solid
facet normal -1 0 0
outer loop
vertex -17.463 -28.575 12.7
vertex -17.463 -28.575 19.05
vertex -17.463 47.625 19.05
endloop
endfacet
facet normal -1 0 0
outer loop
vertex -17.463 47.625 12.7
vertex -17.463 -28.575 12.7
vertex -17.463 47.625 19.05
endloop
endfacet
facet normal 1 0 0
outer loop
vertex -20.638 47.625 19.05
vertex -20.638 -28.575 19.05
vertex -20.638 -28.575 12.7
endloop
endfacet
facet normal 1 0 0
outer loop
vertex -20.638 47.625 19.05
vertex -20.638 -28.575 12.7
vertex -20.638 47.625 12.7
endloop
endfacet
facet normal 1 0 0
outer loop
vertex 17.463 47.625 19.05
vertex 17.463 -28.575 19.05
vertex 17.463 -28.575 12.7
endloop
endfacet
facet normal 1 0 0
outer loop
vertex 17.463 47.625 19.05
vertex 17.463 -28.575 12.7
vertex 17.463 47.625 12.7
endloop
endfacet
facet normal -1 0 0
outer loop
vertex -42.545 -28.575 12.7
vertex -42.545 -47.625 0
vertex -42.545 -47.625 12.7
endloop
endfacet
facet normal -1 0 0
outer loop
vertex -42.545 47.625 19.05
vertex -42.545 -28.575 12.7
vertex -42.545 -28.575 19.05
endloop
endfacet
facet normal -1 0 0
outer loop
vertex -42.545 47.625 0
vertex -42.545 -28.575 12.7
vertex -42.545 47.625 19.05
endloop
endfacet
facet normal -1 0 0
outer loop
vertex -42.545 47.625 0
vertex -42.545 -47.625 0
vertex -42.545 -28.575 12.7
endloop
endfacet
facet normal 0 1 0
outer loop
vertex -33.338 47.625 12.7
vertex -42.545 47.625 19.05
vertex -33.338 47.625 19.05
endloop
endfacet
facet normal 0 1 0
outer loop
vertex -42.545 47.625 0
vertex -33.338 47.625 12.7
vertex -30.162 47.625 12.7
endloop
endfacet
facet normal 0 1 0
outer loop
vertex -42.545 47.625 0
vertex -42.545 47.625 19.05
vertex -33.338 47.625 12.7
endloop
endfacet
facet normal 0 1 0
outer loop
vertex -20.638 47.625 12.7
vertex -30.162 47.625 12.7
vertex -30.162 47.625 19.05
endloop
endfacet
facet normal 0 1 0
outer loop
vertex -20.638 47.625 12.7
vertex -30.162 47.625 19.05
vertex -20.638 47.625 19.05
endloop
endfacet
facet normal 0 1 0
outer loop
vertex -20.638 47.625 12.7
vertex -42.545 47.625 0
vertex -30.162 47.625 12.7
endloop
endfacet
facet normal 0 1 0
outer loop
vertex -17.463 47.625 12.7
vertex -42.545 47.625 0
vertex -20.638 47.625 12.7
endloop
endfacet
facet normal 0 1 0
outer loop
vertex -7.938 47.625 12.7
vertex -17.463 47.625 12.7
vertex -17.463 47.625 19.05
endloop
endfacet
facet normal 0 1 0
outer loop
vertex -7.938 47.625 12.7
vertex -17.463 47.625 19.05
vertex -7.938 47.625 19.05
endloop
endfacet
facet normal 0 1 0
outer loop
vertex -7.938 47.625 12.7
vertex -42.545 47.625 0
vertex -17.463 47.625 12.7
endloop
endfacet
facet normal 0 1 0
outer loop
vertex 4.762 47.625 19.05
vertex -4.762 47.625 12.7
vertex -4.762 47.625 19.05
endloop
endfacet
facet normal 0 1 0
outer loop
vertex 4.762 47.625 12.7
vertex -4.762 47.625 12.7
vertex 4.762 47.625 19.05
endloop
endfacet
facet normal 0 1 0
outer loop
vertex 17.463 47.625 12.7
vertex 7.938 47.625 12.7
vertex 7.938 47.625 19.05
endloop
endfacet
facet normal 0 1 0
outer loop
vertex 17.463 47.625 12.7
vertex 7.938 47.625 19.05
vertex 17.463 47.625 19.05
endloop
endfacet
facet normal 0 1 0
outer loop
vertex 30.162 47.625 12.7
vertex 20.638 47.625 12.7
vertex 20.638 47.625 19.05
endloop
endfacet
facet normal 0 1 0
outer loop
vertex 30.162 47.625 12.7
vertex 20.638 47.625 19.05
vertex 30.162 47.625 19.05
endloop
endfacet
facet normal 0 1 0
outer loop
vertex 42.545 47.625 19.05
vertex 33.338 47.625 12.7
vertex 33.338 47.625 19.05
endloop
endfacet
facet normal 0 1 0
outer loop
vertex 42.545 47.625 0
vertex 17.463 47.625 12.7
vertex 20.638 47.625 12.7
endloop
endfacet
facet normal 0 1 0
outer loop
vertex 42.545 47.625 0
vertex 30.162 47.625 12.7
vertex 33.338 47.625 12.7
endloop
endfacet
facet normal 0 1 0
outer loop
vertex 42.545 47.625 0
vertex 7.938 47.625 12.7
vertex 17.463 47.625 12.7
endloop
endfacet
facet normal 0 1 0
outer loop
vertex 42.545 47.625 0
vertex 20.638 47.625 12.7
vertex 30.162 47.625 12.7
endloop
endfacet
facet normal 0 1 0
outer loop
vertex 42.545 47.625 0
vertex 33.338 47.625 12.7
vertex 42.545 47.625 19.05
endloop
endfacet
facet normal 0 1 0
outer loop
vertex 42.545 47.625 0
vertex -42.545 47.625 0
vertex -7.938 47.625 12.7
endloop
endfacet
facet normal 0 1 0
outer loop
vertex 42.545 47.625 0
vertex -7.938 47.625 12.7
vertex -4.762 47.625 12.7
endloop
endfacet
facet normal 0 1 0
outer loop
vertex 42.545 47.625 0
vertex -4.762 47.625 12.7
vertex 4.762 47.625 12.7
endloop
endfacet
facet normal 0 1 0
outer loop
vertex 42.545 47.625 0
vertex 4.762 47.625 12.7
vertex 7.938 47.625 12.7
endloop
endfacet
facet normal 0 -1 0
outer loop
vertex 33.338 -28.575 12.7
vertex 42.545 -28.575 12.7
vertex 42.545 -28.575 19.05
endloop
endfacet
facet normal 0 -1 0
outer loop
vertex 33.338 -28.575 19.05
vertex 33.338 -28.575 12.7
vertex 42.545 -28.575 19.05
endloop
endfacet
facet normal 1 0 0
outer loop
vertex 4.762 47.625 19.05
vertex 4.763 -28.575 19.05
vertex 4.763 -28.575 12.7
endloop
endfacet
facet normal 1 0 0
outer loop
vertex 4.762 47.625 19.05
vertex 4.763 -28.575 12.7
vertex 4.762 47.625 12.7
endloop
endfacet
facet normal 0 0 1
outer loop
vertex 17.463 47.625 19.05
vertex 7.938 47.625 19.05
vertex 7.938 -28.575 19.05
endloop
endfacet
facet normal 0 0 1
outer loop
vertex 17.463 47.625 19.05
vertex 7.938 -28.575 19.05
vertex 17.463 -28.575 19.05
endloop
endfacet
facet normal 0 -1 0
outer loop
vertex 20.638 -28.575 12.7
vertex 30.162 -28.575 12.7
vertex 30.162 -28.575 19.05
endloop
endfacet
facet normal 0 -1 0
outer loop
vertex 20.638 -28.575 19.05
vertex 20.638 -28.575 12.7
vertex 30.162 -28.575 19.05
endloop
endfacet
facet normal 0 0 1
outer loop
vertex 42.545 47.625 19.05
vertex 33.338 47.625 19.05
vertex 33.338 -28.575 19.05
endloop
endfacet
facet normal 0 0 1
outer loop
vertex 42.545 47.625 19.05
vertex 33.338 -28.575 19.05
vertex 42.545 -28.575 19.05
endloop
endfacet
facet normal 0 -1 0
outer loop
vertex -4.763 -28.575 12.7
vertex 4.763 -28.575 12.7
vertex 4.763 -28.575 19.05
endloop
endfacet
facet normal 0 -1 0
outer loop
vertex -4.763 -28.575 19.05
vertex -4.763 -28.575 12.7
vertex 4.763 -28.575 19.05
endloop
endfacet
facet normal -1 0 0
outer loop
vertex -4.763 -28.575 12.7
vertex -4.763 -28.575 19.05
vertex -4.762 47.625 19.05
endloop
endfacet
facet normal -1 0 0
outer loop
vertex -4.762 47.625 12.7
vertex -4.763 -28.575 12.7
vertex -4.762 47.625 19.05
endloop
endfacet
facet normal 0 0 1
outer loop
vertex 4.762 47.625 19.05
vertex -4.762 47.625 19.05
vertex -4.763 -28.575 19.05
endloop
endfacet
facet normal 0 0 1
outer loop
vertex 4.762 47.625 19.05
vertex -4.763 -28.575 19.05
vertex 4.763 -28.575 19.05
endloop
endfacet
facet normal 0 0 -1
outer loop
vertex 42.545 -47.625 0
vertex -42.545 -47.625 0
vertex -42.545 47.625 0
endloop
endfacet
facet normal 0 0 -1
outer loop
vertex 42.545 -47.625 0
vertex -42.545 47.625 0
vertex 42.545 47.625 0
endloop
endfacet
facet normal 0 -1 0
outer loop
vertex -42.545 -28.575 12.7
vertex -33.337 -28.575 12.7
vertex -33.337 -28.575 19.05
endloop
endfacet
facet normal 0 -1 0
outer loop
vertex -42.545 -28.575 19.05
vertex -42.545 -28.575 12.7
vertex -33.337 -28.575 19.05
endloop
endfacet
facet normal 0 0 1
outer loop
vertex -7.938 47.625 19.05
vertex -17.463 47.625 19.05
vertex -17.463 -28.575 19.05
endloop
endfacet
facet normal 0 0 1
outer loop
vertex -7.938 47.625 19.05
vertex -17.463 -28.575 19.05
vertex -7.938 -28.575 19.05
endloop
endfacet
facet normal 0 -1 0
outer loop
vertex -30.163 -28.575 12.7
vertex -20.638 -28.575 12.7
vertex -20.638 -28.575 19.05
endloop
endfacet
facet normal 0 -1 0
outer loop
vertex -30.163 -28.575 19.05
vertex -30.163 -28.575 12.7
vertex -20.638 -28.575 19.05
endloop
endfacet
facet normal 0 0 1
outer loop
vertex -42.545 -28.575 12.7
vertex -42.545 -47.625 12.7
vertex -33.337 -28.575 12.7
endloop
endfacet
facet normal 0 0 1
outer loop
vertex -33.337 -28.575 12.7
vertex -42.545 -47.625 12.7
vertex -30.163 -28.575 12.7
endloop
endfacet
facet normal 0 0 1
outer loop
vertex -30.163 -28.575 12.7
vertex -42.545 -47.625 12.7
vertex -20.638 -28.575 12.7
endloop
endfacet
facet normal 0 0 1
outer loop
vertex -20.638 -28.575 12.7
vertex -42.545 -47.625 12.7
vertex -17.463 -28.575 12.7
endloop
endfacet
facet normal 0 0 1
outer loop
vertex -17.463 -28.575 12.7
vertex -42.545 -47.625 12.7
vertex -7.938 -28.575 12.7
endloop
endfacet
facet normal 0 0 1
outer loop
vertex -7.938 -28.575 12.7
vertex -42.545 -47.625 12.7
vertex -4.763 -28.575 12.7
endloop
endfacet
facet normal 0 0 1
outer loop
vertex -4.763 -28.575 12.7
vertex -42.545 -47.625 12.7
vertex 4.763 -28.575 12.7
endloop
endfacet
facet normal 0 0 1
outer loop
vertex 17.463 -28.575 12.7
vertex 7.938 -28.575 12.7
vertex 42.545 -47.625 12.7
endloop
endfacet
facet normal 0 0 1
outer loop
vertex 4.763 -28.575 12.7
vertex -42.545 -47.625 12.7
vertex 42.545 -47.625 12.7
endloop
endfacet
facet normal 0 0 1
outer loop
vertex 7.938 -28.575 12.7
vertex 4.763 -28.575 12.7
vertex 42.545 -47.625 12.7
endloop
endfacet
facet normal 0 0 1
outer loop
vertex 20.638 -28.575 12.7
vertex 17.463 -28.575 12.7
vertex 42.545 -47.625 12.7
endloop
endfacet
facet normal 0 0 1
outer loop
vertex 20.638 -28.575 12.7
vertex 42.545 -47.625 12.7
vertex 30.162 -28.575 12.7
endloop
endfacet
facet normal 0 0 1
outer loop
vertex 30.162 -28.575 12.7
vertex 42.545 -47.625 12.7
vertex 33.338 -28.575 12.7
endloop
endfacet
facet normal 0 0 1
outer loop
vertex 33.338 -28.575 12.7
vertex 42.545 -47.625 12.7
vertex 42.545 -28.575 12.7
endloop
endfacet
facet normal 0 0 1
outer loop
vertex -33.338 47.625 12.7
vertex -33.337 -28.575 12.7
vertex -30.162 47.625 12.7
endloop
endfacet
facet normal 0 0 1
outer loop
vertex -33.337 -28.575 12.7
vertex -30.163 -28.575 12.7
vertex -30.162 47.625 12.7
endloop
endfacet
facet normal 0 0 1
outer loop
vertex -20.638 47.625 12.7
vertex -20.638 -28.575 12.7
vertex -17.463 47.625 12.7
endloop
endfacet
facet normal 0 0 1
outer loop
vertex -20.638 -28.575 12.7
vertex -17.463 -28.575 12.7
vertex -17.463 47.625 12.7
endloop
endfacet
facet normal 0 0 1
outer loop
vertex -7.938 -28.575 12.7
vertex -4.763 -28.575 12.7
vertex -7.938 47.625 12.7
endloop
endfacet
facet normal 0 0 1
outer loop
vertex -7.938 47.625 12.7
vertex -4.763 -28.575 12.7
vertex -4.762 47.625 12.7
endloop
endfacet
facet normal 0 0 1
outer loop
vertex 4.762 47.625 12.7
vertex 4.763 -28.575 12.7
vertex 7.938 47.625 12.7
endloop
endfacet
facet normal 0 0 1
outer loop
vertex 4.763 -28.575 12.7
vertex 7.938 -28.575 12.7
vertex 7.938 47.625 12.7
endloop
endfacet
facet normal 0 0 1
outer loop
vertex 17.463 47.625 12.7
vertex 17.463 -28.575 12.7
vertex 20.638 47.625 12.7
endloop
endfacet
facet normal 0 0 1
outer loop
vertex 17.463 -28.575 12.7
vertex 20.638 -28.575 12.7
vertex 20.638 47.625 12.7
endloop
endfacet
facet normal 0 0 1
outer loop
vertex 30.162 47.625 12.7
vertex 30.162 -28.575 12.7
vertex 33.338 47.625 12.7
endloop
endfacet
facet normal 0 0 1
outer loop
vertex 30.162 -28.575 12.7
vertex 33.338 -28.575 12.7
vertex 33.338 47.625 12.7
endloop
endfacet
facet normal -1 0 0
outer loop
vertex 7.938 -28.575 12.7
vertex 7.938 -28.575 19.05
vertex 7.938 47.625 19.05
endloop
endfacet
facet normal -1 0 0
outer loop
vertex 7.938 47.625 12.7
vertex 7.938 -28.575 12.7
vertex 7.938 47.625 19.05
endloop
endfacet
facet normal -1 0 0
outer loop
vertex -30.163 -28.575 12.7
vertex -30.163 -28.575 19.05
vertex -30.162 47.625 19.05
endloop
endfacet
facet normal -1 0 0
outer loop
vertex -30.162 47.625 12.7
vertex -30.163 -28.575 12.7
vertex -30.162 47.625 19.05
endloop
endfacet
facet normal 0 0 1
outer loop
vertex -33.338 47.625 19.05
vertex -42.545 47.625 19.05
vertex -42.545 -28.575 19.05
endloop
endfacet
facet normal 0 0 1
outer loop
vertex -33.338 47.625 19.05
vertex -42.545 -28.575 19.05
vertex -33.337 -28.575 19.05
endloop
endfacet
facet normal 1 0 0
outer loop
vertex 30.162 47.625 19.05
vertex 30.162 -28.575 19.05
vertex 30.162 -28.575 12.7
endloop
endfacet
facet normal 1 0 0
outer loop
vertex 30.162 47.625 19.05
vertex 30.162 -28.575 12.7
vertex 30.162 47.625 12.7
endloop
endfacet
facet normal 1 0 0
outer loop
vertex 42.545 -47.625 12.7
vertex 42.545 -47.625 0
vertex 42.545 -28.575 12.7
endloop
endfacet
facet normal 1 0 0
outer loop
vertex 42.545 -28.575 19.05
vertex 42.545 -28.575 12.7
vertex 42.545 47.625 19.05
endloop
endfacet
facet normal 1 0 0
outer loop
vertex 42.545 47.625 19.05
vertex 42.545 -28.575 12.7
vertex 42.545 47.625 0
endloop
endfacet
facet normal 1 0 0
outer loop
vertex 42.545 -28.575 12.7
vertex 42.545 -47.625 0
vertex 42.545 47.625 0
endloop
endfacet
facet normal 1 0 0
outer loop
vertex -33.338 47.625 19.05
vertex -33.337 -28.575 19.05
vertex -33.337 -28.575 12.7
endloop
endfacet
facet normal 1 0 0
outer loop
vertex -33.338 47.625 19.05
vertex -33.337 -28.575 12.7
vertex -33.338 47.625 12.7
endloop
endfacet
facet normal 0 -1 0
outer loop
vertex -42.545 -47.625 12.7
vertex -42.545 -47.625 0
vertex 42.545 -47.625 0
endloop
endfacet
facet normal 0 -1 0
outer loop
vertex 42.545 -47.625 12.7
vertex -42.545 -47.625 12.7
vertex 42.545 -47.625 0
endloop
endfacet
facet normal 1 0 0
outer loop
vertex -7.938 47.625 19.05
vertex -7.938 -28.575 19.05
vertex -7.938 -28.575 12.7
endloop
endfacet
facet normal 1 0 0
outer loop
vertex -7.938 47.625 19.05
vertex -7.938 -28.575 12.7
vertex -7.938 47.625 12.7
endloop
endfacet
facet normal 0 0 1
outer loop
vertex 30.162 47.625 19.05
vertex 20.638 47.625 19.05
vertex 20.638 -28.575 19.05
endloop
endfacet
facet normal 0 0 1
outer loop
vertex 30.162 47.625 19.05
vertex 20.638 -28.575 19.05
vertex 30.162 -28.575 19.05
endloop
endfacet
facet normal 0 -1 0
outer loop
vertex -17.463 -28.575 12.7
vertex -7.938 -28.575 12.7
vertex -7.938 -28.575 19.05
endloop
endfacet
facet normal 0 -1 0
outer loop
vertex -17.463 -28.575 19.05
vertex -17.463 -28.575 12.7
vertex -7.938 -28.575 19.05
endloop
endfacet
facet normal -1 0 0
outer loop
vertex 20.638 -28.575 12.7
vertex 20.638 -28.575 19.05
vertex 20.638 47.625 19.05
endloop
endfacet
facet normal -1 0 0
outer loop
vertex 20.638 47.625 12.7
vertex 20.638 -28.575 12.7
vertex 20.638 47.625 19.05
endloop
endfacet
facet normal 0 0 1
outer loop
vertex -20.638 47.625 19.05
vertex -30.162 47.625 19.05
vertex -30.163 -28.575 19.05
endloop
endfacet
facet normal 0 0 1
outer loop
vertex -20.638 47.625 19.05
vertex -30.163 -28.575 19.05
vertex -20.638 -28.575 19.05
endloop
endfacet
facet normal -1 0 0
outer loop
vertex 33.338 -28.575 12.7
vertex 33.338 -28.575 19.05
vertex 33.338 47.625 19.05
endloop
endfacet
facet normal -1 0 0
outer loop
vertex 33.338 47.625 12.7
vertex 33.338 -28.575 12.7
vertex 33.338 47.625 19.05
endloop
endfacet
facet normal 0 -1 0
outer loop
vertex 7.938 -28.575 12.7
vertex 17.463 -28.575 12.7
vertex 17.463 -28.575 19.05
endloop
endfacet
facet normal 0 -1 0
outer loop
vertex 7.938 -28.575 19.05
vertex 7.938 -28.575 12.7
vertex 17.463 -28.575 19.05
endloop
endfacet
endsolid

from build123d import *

# Parameters (mm, degrees)
F0_W     = 85.09
F0_H     = 95.25
F1_DEPTH = 19.05
F2_W     = 3.175
F2_H     = 101.6
F3_DEPTH = 6.35
F4_W     = 19.05
F4_H     = 6.35
F5_DEPTH = 85.091


with BuildPart() as f1:
    # F0 (on Top) → F1 (new body)
    with BuildSketch(Plane.XY):
        Rectangle(F0_W, F0_H)
    extrude(amount=F1_DEPTH)

    # F2 (on face) → F3 (cut)
    with BuildSketch(Plane.XY.offset(19.05)):
        with Locations((-31.75, 0)):
            Rectangle(F2_W, F2_H)
        with Locations((-19.05, 0)):
            Rectangle(F2_W, F2_H)
        with Locations((-6.35, 0)):
            Rectangle(F2_W, F2_H)
        with Locations((6.35, 0)):
            Rectangle(F2_W, F2_H)
        with Locations((19.05, 0)):
            Rectangle(F2_W, F2_H)
        with Locations((31.75, 0)):
            Rectangle(F2_W, F2_H)
    extrude(amount=-F3_DEPTH, mode=Mode.SUBTRACT)

    # F4 (on face) → F5 (cut, through all)
    with BuildSketch(Plane.YZ.offset(42.545)):
        with Locations((-38.1, 15.875)):
            Rectangle(F4_W, F4_H)
    extrude(amount=-F5_DEPTH, mode=Mode.SUBTRACT)


solid = f1.part
